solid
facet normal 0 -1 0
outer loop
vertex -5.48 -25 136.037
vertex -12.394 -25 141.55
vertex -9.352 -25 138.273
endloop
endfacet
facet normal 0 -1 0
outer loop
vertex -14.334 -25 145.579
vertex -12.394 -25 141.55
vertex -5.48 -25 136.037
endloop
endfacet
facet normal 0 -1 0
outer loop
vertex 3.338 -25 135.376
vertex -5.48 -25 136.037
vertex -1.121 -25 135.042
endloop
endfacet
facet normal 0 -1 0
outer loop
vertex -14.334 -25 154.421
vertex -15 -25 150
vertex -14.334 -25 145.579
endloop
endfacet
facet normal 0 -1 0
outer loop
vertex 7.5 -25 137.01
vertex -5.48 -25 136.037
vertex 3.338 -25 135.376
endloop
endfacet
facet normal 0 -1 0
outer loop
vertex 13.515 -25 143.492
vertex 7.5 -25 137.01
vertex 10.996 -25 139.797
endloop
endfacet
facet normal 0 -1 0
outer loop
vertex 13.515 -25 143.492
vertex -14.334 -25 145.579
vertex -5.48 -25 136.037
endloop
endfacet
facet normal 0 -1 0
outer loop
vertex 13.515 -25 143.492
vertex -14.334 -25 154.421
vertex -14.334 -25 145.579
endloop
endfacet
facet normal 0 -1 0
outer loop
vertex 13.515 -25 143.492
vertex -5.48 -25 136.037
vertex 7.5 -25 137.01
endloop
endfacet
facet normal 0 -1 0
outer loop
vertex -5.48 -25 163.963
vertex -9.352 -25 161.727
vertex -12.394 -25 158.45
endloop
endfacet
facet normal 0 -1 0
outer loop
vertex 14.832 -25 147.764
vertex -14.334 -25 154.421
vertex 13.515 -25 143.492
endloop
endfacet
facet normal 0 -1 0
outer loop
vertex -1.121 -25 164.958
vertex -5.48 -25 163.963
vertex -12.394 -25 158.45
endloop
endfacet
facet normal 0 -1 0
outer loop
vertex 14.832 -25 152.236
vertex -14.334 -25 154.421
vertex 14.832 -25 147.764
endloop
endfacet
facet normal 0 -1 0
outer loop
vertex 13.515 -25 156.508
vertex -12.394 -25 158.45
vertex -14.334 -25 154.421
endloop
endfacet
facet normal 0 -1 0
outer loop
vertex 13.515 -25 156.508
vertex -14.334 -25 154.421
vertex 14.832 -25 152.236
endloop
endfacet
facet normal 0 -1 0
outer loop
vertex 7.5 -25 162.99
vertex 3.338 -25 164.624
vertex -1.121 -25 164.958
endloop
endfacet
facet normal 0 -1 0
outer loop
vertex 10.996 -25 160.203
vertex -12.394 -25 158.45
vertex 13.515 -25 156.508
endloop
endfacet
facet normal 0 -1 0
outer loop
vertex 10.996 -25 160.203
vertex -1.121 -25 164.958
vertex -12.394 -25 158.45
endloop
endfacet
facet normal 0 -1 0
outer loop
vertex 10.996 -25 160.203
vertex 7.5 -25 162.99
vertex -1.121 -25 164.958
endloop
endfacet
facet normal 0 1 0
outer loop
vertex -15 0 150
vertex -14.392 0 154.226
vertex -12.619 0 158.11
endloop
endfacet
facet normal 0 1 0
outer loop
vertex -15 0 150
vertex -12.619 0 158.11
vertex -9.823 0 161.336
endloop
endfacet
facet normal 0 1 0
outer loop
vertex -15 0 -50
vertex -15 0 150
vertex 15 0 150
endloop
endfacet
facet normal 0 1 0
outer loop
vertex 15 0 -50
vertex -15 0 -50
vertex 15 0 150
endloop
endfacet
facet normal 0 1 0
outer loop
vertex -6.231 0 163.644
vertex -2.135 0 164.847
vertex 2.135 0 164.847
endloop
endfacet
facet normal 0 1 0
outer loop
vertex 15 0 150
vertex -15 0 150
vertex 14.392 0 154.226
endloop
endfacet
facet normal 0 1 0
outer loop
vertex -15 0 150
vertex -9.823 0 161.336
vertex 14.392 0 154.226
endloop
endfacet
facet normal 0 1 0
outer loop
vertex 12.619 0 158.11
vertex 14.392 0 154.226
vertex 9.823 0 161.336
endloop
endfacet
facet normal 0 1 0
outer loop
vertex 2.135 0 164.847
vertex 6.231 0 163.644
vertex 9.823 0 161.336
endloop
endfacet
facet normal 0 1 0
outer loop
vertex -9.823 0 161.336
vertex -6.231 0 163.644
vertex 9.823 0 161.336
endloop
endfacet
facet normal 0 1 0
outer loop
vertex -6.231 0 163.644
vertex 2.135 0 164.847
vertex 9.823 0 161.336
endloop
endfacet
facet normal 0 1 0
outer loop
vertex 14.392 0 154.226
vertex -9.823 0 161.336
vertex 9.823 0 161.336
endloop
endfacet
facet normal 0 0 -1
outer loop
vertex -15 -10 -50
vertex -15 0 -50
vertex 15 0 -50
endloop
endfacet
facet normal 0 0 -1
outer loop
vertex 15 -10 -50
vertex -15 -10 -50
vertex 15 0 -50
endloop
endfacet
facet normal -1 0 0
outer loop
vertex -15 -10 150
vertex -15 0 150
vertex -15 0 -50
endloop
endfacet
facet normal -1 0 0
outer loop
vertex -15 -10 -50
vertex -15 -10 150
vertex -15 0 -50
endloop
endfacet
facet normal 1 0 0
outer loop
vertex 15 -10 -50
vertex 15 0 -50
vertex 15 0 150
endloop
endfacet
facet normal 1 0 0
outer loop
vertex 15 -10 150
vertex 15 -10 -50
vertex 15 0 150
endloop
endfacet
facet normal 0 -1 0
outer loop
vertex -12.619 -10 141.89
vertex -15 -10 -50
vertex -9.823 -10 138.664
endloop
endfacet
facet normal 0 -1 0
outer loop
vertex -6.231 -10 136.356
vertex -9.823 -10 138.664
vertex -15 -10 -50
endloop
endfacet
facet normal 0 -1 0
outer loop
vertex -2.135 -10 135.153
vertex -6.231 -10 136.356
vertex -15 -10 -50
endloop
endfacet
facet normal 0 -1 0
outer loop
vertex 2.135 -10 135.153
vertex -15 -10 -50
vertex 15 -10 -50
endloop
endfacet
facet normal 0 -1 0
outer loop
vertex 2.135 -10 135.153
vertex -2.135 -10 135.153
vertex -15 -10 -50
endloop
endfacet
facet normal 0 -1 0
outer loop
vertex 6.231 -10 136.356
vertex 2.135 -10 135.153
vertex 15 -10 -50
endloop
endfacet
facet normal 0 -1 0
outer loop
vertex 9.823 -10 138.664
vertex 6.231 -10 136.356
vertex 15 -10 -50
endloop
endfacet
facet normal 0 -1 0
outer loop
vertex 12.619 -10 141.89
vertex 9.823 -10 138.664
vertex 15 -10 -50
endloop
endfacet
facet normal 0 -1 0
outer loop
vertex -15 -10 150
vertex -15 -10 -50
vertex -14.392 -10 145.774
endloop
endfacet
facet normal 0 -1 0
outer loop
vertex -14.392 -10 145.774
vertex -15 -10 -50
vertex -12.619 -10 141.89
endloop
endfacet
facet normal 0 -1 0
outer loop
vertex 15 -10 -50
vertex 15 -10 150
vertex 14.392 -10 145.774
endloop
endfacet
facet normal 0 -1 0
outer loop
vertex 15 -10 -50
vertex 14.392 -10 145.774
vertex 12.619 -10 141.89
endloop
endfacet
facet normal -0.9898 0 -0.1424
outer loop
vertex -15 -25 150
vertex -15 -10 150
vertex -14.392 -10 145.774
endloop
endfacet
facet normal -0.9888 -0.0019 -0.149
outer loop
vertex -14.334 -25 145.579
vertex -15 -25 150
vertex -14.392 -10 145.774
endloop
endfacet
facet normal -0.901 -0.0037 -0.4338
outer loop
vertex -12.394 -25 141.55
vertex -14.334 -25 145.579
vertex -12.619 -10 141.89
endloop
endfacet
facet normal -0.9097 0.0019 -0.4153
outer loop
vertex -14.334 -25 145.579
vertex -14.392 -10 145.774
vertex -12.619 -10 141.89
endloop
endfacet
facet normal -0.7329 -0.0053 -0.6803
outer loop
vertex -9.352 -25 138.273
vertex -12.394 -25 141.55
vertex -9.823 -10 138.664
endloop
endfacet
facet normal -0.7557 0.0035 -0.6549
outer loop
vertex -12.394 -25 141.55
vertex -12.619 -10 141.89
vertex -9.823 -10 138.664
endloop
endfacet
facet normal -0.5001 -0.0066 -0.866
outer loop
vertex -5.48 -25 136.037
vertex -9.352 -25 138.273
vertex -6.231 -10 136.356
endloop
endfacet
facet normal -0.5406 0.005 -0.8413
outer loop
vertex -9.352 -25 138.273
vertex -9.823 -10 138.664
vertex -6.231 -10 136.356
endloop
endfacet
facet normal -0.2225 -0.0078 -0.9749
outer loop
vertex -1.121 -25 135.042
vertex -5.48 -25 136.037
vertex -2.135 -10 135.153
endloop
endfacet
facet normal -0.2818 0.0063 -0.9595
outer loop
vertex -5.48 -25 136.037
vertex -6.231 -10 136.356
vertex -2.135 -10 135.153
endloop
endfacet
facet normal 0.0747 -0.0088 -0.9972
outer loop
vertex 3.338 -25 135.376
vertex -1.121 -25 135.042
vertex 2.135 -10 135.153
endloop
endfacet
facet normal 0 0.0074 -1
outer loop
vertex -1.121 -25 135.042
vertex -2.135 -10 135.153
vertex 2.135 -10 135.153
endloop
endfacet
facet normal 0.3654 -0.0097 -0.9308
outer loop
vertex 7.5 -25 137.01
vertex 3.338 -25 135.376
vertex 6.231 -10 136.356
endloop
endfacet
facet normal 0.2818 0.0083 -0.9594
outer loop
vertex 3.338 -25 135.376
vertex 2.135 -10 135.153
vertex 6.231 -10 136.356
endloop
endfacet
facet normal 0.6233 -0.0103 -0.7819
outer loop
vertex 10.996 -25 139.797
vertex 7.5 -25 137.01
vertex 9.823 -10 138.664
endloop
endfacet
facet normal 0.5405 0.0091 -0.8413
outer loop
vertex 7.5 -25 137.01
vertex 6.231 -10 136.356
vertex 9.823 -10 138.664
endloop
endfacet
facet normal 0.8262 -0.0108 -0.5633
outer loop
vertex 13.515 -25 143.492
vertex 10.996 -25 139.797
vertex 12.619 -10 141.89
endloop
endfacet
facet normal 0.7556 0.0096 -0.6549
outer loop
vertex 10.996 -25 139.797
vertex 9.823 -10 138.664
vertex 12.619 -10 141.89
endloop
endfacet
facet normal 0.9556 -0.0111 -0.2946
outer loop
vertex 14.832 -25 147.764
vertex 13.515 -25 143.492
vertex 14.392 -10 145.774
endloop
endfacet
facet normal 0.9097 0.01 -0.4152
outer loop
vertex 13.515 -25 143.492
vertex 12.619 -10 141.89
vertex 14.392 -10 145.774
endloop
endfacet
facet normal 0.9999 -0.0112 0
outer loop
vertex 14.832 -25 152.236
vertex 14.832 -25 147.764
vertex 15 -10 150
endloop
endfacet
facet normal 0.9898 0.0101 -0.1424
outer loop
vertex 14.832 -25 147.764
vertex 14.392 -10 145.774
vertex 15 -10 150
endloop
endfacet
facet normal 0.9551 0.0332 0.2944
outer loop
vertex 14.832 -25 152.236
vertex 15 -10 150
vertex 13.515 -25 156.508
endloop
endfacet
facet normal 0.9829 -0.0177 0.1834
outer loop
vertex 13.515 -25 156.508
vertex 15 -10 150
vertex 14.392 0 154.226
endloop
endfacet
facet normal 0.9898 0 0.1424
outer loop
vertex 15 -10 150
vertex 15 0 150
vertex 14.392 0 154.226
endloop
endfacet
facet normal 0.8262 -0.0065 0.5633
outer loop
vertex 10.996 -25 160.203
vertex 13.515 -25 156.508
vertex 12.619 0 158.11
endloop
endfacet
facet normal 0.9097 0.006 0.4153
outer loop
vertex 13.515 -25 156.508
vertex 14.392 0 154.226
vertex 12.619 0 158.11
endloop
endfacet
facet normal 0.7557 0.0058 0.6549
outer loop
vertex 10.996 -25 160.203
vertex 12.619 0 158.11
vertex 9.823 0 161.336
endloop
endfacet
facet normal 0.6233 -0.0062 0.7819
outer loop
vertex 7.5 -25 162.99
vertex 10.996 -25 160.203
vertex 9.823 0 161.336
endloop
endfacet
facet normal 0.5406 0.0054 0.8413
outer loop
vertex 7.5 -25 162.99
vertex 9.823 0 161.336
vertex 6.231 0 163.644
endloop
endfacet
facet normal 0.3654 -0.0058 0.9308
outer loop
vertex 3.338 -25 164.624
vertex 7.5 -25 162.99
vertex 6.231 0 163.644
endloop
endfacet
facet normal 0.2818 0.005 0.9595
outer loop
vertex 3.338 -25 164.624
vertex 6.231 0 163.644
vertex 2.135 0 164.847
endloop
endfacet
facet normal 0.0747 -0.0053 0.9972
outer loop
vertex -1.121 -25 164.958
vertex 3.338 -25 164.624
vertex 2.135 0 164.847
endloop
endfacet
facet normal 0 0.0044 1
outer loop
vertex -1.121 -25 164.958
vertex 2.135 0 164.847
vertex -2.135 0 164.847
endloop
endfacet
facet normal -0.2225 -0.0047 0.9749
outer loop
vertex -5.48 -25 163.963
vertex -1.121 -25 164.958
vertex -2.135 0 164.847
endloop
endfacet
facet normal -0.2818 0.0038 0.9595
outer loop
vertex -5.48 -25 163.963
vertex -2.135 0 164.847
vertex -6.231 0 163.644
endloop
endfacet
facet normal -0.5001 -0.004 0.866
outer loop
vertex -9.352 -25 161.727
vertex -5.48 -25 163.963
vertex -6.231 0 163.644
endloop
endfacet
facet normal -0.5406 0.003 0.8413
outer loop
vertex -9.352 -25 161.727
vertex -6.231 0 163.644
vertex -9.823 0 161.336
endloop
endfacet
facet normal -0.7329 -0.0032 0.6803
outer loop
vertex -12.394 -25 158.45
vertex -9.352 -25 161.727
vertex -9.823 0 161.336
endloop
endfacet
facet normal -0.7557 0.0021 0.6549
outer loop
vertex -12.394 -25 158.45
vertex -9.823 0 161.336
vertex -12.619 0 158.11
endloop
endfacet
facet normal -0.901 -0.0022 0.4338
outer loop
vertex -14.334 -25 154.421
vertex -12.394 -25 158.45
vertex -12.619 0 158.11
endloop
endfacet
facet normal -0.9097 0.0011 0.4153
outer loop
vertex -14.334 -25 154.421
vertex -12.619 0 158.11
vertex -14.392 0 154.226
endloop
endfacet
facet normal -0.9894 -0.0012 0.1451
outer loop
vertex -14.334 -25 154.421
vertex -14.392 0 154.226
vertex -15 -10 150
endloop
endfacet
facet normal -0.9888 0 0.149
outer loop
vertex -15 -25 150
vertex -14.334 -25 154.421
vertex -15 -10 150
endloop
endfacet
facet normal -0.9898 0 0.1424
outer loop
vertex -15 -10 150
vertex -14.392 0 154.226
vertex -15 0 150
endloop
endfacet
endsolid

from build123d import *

# Parameters (mm, degrees)
F1_DEPTH = 25
F2_DEPTH = 10


with BuildPart() as f1:
    # F0 (on Front) → F1 (new body)
    with BuildSketch(Plane.XZ):
        with BuildLine():
            ThreePointArc((15, 150), (0, 165), (-15, 150))
            Line((-15, 150), (15, 150))
        make_face()
        with BuildLine():
            Line((15, 150), (-15, 150))
            ThreePointArc((-15, 150), (0, 135), (15, 150))
        make_face()
    extrude(amount=F1_DEPTH)

    # F0 (on Front) → F2 (join)
    with BuildSketch(Plane.XZ):
        with BuildLine():
            ThreePointArc((15, 150), (0, 165), (-15, 150))
            Line((-15, 150), (15, 150))
        make_face()
        with BuildLine():
            ThreePointArc((15, 150), (0, 135), (-15, 150))
            Line((-15, 150), (-15, -50))
            Line((-15, -50), (15, -50))
            Line((15, -50), (15, 150))
        make_face()
    extrude(amount=F2_DEPTH)


solid = f1.part
